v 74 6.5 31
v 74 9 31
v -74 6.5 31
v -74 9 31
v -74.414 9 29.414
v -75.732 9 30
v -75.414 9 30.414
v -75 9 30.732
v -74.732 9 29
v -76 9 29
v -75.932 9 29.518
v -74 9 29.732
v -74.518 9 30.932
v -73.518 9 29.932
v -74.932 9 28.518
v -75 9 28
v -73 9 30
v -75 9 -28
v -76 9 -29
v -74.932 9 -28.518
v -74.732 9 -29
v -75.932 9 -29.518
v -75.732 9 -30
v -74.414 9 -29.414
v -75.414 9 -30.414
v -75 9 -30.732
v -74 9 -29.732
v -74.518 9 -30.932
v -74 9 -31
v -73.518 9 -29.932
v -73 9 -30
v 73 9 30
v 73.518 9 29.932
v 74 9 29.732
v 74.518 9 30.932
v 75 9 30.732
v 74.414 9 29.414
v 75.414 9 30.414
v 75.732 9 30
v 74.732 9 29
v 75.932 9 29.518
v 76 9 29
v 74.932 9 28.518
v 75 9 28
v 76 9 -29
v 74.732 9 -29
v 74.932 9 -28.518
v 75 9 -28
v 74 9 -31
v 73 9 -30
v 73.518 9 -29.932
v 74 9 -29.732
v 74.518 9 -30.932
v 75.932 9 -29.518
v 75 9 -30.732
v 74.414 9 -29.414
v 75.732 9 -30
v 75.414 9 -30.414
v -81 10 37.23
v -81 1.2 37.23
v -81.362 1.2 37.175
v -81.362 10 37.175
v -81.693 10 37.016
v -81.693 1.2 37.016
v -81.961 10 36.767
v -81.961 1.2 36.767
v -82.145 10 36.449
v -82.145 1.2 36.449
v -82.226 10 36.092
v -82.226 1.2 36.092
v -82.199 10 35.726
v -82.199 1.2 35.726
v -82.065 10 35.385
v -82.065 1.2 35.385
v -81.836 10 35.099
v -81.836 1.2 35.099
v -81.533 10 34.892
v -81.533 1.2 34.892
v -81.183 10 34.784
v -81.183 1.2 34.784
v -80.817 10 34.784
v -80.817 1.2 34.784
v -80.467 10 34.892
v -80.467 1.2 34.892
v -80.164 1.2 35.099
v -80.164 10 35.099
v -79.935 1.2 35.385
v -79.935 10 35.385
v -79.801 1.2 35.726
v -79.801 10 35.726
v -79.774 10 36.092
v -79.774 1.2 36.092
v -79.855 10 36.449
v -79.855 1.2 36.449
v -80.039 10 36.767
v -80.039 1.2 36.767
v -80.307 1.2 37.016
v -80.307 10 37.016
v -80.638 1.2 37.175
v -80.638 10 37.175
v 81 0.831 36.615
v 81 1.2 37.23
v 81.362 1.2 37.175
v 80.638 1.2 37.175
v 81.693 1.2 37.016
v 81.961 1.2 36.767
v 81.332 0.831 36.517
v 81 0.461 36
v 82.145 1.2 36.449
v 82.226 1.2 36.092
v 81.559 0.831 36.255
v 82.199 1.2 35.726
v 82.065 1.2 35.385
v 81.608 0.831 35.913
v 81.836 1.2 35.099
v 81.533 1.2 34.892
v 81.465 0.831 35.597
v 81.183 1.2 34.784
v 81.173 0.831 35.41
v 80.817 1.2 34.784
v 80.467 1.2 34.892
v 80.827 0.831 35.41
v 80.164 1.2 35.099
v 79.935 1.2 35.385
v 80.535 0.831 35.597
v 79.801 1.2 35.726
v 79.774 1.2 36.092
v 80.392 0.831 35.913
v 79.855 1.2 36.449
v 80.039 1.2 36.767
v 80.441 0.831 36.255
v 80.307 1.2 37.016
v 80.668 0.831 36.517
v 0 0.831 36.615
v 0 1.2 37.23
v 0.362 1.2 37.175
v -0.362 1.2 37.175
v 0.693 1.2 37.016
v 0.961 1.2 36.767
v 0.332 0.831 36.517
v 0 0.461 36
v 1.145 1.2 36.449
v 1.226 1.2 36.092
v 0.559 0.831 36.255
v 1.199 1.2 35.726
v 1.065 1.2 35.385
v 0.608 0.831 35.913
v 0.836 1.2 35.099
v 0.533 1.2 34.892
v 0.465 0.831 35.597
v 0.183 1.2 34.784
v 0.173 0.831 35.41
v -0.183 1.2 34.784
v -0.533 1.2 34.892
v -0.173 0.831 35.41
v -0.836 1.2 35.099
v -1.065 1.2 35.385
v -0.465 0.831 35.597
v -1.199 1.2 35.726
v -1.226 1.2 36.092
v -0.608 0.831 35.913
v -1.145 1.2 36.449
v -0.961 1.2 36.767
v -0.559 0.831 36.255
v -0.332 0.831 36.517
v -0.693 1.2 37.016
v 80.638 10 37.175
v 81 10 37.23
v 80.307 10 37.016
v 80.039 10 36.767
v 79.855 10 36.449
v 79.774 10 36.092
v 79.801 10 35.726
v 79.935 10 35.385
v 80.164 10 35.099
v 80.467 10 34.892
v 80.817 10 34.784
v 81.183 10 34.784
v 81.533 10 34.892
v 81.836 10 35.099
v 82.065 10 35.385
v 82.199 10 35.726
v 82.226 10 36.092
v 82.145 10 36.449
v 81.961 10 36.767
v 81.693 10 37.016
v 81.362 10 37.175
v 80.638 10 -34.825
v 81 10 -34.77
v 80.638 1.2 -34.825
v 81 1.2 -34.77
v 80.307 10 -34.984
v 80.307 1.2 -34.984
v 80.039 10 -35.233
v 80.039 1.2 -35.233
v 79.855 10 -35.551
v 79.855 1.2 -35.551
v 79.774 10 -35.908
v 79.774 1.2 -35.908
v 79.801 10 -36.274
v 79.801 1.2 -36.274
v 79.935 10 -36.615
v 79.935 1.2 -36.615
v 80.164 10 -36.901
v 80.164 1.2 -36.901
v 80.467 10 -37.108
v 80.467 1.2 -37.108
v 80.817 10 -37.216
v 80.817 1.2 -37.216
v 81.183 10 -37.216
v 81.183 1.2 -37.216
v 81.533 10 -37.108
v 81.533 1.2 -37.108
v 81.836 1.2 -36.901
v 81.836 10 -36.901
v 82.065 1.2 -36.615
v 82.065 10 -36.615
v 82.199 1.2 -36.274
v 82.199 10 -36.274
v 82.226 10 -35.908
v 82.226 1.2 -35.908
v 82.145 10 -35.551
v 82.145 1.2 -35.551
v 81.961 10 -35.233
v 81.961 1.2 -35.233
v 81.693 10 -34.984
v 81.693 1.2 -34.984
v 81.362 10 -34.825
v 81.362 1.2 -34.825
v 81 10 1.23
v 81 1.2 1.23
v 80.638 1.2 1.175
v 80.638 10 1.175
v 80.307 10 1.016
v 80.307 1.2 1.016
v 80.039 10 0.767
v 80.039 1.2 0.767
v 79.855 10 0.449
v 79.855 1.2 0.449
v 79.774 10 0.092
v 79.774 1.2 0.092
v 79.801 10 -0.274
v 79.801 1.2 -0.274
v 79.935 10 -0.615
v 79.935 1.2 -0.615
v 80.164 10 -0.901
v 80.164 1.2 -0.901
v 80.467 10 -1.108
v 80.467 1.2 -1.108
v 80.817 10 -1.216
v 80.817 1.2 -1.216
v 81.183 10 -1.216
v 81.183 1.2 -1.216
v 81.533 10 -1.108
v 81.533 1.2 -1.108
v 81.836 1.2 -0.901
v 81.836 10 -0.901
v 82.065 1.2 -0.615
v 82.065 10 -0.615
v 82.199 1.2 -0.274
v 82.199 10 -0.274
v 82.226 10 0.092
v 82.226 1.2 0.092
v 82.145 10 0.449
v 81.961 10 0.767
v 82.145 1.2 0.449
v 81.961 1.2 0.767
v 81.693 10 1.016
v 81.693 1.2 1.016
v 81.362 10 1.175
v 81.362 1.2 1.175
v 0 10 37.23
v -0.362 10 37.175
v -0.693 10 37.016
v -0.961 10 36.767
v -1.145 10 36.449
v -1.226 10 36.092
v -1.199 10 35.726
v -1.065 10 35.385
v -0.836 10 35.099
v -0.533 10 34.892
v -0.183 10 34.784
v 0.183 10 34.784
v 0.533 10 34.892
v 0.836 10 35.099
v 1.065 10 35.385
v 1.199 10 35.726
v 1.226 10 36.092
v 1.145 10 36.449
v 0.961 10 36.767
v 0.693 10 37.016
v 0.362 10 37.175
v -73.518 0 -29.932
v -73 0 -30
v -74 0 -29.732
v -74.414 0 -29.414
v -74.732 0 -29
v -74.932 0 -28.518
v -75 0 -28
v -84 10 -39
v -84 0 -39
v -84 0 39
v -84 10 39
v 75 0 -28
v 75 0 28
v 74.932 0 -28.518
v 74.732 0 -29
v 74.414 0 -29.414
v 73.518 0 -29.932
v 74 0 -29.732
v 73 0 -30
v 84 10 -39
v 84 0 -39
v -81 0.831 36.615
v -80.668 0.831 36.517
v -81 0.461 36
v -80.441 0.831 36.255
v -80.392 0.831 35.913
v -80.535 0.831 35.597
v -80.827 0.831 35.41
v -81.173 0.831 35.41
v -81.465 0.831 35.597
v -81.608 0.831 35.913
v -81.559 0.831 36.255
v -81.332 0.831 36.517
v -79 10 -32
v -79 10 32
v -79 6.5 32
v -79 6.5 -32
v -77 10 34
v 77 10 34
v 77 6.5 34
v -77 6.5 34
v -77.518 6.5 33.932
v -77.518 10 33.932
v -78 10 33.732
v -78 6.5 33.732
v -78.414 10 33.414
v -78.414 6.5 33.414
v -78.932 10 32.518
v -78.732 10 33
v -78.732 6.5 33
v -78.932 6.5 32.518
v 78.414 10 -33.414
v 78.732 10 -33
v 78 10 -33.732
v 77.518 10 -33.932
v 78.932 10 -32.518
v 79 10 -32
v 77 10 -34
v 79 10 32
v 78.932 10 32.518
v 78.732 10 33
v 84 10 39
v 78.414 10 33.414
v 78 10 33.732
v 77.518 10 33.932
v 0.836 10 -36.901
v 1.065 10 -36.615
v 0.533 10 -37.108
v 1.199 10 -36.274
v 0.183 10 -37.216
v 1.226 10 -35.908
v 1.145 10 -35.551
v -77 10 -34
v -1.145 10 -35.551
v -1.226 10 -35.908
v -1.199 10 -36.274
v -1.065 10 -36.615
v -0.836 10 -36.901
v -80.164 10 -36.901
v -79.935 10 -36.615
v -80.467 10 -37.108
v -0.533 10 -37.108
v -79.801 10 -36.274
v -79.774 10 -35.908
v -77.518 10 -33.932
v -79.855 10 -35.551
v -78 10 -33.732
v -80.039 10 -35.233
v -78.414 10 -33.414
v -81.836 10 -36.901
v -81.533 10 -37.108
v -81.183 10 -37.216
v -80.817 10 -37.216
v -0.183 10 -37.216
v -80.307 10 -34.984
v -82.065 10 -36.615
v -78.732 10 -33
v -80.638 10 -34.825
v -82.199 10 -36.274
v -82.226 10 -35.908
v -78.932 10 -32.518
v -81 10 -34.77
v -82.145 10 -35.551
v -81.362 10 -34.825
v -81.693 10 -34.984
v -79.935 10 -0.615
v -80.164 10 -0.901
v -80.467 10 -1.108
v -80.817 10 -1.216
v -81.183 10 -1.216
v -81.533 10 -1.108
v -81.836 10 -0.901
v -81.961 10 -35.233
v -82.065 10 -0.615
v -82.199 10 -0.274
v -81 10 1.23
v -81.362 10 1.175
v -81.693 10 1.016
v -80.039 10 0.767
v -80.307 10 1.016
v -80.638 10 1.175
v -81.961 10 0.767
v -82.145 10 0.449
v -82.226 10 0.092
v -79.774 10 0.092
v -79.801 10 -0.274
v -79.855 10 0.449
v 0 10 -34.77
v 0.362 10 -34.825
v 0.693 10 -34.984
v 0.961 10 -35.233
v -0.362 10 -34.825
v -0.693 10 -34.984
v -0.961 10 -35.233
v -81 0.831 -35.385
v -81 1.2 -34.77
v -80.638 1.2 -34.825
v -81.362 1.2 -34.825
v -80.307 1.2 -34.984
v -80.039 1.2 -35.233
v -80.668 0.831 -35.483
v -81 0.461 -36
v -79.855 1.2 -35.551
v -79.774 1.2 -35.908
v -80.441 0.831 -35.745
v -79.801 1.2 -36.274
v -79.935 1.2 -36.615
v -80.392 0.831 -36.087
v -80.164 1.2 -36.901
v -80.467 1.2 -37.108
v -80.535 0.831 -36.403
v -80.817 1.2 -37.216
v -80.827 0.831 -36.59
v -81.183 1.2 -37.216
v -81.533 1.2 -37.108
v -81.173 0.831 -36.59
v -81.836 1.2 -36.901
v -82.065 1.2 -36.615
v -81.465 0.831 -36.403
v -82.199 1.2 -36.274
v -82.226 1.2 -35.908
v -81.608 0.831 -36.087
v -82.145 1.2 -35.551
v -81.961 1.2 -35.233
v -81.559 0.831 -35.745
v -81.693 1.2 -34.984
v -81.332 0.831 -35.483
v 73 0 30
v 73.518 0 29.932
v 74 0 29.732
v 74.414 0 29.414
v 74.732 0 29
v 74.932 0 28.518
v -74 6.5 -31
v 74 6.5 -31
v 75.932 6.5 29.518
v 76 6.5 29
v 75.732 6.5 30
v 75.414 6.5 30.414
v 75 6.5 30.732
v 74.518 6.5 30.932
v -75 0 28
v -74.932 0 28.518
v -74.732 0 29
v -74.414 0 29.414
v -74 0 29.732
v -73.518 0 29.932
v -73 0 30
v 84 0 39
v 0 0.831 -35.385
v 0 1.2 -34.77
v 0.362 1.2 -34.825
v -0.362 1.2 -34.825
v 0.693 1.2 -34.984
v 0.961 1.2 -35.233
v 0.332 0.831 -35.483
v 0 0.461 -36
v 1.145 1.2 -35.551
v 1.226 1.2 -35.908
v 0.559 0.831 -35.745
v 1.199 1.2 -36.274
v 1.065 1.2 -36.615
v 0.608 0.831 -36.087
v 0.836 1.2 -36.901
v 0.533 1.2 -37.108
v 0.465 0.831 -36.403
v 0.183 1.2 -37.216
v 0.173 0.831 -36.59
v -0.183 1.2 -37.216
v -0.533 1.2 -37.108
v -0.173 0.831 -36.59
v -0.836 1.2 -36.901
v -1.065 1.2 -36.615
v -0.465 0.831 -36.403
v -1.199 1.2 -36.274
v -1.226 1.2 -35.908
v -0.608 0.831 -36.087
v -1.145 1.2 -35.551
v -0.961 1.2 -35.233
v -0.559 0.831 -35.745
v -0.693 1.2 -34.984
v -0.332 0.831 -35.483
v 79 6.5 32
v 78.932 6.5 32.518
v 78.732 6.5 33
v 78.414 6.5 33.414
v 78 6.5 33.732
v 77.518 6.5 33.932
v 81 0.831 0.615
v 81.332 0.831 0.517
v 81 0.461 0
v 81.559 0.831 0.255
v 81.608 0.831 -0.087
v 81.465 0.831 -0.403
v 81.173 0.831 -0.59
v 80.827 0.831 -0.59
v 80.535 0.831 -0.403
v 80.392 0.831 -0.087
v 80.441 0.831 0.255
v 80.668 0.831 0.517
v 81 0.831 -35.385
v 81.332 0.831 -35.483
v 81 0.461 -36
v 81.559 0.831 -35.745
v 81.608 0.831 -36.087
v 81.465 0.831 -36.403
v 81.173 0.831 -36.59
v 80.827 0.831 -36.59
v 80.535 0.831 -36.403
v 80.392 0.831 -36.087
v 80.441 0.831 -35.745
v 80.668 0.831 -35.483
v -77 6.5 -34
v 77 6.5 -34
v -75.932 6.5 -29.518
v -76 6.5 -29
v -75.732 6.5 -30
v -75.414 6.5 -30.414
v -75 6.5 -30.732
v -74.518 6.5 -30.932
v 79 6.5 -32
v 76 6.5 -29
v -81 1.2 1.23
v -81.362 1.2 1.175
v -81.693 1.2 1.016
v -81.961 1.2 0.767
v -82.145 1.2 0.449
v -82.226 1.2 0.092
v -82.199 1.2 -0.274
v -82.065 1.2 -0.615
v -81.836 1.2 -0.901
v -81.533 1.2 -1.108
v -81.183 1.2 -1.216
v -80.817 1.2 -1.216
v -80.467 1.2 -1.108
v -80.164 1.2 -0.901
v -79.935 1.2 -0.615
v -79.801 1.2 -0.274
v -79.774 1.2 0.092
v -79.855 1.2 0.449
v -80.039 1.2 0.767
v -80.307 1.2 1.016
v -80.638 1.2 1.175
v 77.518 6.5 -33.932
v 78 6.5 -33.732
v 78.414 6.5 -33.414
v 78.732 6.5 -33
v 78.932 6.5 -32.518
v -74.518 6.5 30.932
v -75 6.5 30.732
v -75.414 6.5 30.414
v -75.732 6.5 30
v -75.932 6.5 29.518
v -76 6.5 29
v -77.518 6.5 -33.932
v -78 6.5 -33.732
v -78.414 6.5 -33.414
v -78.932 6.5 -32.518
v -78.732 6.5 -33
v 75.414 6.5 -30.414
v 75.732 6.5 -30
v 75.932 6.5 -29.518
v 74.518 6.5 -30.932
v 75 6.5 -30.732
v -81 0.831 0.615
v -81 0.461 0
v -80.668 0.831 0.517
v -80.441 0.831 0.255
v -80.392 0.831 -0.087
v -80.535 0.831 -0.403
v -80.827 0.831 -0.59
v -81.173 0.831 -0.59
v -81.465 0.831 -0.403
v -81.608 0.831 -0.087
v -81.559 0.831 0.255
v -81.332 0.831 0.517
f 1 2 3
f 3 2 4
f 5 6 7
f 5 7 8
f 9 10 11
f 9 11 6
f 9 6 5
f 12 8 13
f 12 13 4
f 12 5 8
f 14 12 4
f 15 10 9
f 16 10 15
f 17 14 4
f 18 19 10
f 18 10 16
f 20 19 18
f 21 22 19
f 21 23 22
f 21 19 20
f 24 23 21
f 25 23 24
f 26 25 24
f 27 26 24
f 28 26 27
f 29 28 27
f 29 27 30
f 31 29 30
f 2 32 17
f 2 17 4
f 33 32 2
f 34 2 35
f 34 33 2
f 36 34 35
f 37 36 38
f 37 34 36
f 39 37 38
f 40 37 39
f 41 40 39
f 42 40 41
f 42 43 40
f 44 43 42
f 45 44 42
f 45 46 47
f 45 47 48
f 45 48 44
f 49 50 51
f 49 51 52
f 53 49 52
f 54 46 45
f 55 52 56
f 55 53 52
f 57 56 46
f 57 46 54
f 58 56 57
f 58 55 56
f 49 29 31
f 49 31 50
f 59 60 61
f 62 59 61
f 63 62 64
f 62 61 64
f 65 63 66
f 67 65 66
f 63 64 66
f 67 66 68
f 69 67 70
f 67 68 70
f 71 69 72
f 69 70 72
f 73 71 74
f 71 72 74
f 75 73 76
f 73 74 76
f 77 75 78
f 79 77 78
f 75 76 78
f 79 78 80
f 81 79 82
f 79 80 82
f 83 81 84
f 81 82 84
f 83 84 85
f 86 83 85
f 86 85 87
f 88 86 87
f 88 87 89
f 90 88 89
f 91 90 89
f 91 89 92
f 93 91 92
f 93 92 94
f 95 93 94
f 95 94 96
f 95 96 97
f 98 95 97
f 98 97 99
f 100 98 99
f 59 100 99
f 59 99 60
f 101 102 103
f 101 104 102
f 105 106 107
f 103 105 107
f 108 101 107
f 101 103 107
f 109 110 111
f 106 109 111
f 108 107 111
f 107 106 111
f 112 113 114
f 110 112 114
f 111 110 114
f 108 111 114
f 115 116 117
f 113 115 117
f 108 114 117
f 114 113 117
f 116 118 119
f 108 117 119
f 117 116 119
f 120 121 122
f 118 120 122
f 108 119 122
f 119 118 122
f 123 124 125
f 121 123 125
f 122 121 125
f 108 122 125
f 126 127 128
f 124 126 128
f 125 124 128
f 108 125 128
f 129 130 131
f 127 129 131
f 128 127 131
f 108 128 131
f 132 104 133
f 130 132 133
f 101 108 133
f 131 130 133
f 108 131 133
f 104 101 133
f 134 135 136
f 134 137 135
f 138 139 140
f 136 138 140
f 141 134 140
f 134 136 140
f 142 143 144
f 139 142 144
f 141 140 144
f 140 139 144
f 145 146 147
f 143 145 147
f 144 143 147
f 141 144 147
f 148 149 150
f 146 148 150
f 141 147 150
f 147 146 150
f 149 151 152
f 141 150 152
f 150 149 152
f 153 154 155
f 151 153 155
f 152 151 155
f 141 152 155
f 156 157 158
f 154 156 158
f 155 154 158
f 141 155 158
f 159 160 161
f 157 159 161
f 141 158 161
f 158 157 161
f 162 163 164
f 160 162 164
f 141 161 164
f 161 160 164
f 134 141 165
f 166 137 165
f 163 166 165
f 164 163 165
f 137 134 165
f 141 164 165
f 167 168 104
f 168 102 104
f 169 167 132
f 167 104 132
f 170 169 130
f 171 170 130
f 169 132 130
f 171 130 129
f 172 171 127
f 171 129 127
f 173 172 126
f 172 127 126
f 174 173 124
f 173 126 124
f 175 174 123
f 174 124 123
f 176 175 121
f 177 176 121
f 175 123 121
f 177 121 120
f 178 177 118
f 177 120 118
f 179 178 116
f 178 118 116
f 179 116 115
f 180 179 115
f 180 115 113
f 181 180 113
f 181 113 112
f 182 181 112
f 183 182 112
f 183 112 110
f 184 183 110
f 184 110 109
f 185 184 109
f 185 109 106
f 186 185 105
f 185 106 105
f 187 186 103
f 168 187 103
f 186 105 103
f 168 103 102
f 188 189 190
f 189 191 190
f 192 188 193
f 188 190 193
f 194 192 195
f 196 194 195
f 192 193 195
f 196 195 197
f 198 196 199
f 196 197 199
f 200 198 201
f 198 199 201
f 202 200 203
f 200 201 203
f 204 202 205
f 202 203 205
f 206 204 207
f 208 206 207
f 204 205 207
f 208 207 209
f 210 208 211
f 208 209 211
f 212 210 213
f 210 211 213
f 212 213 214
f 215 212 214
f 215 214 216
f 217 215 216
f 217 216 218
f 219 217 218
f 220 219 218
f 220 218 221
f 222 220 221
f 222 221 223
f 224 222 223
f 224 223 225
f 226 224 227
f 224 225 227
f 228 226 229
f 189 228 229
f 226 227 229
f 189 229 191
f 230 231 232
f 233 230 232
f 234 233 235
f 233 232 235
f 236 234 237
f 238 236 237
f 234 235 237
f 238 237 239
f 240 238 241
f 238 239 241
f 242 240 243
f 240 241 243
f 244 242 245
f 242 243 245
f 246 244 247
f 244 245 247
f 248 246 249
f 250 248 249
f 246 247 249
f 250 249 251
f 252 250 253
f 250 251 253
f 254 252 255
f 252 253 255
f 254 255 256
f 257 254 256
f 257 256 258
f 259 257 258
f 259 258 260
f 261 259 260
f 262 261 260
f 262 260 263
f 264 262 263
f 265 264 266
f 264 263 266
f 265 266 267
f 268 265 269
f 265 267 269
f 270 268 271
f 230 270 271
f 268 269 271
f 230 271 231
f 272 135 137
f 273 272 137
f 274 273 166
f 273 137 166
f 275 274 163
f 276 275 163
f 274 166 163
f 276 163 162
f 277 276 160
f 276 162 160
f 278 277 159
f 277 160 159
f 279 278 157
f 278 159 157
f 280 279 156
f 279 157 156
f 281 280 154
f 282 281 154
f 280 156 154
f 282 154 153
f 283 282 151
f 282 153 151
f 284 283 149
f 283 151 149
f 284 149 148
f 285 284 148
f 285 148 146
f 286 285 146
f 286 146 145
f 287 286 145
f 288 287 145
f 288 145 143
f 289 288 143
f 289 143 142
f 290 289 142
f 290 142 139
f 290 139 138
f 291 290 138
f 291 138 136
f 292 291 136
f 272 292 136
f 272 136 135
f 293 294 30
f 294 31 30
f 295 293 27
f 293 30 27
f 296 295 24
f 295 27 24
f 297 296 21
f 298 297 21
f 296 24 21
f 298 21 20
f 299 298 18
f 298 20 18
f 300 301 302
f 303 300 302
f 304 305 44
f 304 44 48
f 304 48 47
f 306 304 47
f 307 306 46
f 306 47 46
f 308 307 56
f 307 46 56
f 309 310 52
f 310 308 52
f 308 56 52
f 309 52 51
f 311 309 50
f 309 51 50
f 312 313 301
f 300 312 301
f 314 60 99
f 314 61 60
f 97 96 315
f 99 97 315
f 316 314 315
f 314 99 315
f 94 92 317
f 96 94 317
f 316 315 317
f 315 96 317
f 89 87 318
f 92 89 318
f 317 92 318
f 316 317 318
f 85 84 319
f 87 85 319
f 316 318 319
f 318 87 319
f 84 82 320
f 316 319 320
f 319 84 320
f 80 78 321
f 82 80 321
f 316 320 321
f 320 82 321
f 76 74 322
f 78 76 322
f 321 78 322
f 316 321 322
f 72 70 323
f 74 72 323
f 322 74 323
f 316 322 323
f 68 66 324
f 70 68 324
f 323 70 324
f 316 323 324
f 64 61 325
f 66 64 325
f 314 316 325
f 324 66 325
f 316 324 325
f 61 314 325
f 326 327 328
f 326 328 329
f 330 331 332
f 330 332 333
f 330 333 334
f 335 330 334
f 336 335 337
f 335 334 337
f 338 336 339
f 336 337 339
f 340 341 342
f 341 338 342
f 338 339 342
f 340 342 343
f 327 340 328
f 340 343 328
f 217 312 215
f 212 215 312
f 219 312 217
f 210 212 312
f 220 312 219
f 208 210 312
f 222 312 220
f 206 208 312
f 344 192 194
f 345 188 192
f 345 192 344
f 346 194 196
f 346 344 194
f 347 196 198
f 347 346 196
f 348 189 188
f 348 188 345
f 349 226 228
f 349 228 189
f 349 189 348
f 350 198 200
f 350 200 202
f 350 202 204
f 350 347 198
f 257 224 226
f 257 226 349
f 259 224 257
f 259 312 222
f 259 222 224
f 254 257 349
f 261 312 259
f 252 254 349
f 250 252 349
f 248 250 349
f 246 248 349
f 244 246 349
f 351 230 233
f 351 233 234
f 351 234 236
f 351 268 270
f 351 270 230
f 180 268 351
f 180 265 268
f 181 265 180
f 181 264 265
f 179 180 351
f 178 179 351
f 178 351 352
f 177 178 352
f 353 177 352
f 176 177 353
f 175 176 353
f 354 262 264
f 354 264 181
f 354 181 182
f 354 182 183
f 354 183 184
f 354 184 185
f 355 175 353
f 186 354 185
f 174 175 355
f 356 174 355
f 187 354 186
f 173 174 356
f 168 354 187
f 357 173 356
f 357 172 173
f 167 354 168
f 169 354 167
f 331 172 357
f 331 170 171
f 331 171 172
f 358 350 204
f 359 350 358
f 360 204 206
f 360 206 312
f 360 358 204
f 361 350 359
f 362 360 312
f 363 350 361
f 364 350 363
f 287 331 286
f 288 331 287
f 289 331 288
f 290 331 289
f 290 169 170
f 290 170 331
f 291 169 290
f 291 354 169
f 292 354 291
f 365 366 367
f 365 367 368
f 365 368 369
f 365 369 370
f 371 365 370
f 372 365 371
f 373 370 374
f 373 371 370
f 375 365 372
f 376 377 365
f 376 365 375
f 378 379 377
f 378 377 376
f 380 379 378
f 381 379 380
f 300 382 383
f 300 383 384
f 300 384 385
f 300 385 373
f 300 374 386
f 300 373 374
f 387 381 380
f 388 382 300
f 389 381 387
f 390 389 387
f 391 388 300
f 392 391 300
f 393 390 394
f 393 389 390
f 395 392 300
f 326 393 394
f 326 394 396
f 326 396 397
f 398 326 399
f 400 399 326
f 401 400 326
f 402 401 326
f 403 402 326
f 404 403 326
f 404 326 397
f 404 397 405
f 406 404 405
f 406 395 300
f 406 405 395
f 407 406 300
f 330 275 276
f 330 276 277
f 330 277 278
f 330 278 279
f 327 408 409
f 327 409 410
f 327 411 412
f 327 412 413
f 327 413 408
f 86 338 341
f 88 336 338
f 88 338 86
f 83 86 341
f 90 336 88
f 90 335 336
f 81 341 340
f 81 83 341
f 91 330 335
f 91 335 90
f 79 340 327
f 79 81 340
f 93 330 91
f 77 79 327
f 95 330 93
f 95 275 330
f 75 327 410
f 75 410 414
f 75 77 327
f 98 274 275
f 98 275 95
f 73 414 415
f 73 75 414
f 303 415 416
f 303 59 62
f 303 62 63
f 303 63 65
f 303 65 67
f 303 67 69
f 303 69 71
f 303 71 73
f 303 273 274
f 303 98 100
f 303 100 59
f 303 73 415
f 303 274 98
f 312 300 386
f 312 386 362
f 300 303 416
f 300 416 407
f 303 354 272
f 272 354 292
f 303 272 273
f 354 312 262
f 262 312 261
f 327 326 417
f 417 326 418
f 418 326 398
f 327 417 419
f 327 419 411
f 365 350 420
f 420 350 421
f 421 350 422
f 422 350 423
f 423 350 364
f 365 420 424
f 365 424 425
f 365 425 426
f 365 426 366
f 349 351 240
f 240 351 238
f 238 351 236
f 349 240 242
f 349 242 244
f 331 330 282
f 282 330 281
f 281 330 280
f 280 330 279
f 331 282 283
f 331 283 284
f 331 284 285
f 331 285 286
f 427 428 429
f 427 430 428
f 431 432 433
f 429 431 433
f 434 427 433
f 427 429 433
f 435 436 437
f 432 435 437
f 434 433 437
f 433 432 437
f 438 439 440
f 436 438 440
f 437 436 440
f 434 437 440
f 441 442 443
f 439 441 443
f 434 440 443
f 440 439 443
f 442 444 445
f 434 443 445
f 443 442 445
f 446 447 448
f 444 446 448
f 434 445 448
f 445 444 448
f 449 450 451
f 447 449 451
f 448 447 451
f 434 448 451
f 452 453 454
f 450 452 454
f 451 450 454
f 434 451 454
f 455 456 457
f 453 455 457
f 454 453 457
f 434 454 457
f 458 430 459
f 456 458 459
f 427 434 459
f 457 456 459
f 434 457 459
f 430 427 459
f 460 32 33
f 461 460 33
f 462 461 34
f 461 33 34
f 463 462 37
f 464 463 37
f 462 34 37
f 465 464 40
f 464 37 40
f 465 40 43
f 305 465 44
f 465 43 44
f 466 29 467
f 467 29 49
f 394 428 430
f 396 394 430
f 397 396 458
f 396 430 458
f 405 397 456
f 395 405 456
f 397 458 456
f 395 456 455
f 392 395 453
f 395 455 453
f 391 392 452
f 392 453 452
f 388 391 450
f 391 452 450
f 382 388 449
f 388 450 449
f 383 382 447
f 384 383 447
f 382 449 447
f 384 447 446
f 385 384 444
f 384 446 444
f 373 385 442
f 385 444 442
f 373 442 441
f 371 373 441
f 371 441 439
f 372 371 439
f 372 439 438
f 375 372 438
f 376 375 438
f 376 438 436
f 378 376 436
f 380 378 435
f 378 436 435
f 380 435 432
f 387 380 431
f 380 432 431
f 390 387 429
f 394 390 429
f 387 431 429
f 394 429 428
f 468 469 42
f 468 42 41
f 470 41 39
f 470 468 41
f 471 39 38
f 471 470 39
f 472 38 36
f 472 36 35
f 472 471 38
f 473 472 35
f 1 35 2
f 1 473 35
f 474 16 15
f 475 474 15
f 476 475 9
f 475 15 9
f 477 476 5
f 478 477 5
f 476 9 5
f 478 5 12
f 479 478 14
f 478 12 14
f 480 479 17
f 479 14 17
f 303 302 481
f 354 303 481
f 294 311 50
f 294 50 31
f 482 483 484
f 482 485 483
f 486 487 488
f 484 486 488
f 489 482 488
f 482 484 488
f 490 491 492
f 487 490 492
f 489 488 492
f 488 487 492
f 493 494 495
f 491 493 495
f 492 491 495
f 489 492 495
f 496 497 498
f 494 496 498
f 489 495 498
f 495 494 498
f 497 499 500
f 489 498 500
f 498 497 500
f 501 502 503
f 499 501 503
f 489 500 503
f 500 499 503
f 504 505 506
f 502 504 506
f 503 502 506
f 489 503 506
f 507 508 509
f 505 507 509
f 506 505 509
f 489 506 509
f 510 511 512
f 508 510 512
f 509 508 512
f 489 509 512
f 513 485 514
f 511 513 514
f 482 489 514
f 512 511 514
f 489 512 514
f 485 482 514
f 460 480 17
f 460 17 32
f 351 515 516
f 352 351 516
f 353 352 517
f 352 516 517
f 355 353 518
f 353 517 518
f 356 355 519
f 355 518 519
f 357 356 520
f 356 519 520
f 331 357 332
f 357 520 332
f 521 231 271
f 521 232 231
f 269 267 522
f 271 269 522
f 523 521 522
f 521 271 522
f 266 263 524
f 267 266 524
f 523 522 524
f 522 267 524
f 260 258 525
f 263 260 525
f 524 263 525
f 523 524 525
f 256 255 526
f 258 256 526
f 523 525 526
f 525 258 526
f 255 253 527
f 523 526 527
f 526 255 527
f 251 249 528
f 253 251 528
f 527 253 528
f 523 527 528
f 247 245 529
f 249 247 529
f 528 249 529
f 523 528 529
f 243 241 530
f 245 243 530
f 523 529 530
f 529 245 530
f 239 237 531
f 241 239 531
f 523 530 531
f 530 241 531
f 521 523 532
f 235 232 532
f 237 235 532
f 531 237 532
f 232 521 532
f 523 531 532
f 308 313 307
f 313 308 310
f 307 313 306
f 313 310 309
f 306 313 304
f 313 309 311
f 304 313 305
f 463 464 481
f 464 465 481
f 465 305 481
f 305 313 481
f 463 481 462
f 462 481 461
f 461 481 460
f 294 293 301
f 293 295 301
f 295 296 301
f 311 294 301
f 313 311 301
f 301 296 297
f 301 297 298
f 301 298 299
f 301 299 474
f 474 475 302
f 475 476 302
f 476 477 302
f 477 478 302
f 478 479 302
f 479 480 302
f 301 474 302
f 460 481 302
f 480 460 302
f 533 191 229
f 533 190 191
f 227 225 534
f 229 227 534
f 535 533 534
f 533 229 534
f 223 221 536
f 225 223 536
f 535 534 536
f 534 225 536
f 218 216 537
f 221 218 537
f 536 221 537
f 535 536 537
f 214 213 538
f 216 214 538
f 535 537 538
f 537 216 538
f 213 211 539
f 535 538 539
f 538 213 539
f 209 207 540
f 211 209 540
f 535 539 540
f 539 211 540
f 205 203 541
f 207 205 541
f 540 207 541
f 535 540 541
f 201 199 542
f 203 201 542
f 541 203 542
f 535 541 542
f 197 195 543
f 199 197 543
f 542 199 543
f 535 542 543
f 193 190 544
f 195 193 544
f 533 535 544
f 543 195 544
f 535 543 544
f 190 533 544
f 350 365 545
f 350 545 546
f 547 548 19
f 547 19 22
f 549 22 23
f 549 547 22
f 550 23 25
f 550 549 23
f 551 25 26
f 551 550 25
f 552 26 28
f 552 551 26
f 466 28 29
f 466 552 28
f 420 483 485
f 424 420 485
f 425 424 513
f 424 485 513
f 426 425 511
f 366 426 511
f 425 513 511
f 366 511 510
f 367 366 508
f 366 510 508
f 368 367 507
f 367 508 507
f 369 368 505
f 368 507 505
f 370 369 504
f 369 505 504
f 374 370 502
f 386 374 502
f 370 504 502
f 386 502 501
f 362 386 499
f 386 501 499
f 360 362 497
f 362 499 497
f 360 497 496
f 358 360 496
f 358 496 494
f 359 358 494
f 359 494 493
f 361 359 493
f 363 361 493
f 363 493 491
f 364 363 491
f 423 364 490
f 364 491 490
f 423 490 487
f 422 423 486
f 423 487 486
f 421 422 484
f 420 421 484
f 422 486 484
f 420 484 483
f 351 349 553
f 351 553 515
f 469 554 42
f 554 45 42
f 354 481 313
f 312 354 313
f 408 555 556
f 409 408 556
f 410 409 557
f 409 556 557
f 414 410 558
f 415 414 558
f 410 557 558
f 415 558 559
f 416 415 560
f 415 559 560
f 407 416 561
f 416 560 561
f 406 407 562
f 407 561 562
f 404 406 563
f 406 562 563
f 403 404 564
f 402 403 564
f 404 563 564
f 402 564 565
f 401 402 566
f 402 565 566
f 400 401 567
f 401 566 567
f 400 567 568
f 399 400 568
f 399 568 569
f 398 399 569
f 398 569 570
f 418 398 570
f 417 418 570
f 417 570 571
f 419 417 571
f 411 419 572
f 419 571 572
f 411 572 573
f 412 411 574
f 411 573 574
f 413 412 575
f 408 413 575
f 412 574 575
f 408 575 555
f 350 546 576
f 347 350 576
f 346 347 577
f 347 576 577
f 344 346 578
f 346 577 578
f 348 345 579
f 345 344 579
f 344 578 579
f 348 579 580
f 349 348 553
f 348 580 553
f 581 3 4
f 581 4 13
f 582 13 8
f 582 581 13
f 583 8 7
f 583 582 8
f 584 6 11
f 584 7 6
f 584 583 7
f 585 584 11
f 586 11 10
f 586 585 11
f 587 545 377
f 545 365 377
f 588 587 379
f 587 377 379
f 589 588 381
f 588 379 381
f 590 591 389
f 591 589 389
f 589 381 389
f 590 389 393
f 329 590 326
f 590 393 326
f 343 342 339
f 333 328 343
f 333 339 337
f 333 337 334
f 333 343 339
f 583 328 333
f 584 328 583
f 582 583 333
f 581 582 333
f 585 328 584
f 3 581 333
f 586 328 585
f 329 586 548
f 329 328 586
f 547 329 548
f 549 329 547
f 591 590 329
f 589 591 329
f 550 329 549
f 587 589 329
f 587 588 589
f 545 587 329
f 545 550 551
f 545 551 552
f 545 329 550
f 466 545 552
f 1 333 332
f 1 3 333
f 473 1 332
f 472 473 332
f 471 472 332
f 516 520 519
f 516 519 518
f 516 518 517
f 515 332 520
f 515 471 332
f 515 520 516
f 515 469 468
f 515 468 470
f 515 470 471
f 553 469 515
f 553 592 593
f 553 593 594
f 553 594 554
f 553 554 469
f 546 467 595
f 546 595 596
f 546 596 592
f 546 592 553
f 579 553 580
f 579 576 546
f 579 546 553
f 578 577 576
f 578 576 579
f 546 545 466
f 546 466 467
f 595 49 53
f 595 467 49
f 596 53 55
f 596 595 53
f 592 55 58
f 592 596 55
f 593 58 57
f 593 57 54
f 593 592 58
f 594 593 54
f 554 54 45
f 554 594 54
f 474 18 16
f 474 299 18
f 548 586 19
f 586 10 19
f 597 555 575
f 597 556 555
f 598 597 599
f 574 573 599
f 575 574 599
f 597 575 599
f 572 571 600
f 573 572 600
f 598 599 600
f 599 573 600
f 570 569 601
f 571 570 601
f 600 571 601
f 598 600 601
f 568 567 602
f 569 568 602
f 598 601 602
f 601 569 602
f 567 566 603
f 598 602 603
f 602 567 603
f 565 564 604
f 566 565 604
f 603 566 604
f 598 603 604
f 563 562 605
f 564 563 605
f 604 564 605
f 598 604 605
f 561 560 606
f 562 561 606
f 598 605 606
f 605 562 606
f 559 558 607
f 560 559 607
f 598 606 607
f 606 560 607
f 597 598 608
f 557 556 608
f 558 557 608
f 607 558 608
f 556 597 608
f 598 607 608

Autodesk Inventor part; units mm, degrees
ref_plane "YZ Plane" through (0, 0, 0) normal (1, 0, 0) x (0, 1, 0)
ref_plane "XZ Plane" through (0, 0, 0) normal (0, 1, 0) x (-1, 0, 0)
ref_plane "XY Plane" through (0, 0, 0) normal (0, 0, 1) x (1, 0, 0)
sketch "Sketch2" plane through (0, 0, 0) normal (0, 1, 0) x (-1, 0, 0)
  line L0 (-75, -30) -> (75, -30)
  line L1 (75, -30) -> (75, 30)
  line L2 (75, 30) -> (-75, 30)
  line L3 (-75, 30) -> (-75, -30)
  line L4 (-75, -30) -> (75, 30) construction
  line L5 (75, -30) -> (-75, 30) construction
  line L6 (-84, -39) -> (84, -39)
  line L7 (84, -39) -> (84, 39)
  line L8 (84, 39) -> (-84, 39)
  line L9 (-84, 39) -> (-84, -39)
  line L10 (-84, -39) -> (84, 39) construction
  line L11 (84, -39) -> (-84, 39) construction
  point P0 (0, 0)
  dimension "d0" = 150
  dimension "d1" = 60
  dimension "d4" = 9
  dimension "d5" = 9
  dimension "d53" = 168
  dimension "d54" = 78
extrude "Extrusion1" add sketch "Sketch2" along normal blind 10
sketch "Sketch4" plane through (0, 10, 0) normal (0, 1, 0) x (1, 0, 0)
  line L0 (-84, 39) -> (-84, -39) construction
  line L1 (-84, -39) -> (84, -39) construction
  line L2 (84, -39) -> (84, 39) construction
  line L3 (84, 39) -> (-84, 39) construction
  line L4 (75, 30) -> (75, -30) construction
  line L5 (75, -30) -> (-75, -30) construction
  line L6 (-75, -30) -> (-75, 30) construction
  line L7 (-75, 30) -> (75, 30) construction
  line L8 (-75, 30) -> (75, 30)
  line L9 (75, 30) -> (75, -30)
  line L10 (75, -30) -> (-75, -30)
  line L11 (-75, -30) -> (-75, 30)
  line L12 (-75, 30) -> (75, -30) construction
  line L13 (75, 30) -> (-75, -30) construction
  line L14 (-79, 34) -> (79, 34)
  line L15 (79, 34) -> (79, -34)
  line L16 (79, -34) -> (-79, -34)
  line L17 (-79, -34) -> (-79, 34)
  line L18 (-79, 34) -> (79, -34) construction
  line L19 (79, 34) -> (-79, -34) construction
  point P0 (0, 0)
  dimension "d8" = 4
  dimension "d9" = 4
extrude "Extrusion2" cut sketch "Sketch4" against normal blind 1
sketch "Sketch7" plane through (0, 9, 0) normal (0, 1, 0) x (1, 0, 0)
  line L0 (79, -34) -> (-79, -34) construction
  line L1 (79, 34) -> (79, -34) construction
  line L2 (-79, 34) -> (79, 34) construction
  line L3 (-79, -34) -> (-79, 34) construction
  line L4 (75, 30) -> (-75, 30) construction
  line L5 (75, -30) -> (75, 30) construction
  line L6 (-75, -30) -> (75, -30) construction
  line L7 (-75, 30) -> (-75, -30) construction
  line L8 (-76, 31) -> (76, 31)
  line L9 (76, 31) -> (76, -31)
  line L10 (76, -31) -> (-76, -31)
  line L11 (-76, -31) -> (-76, 31)
  line L12 (-76, 31) -> (76, -31) construction
  line L13 (76, 31) -> (-76, -31) construction
  line L14 (-79, 34) -> (79, 34)
  line L15 (79, 34) -> (79, -34)
  line L16 (79, -34) -> (-79, -34)
  line L17 (-79, -34) -> (-79, 34)
  line L18 (-79, 34) -> (79, -34) construction
  line L19 (79, 34) -> (-79, -34) construction
  point P0 (0, 0)
  dimension "d15" = 3
  dimension "d16" = 3
extrude "Extrusion3" cut sketch "Sketch7" against normal blind 2.5
fillet "Fillet1" radius 2 8 edges at (76, 7.75, 31) (-76, 7.75, 31) (-76, 7.75, -31) (76, 7.75, -31) (75, 4.5, 30) (75, 4.5, -30) (-75, 4.5, -30) (-75, 4.5, 30)
fillet "Fillet2" radius 2 4 edges at (79, 8.25, 34) (79, 8.25, -34) (-79, 8.25, 34) (-79, 8.25, -34)
sketch "Sketch8" plane through (0, 10, 0) normal (0, 1, 0) x (1, 0, 0)
  line L0 (79, 32) -> (79, -32) construction
  arc A0 (77, -34) -> (79, -32) centre (77, -32) ccw construction
  line L1 (77, -34) -> (-77, -34) construction
  arc A1 (-79, -32) -> (-77, -34) centre (-77, -32) ccw construction
  line L2 (-79, -32) -> (-79, 32) construction
  arc A2 (-77, 34) -> (-79, 32) centre (-77, 32) ccw construction
  line L3 (-77, 34) -> (77, 34) construction
  arc A3 (79, 32) -> (77, 34) centre (77, 32) ccw construction
  line L4 (-84, 39) -> (-84, -39) construction
  line L5 (-84, -39) -> (84, -39) construction
  line L6 (84, -39) -> (84, 39) construction
  line L7 (84, 39) -> (-84, 39) construction
  line L8 (152.6, 0) -> (-152.6, 0) construction
  line L9 (0, 68.6) -> (0, -68.6) construction
  line L10 (-75, 28) -> (-75, -28) construction
  line L11 (73, 30) -> (-73, 30) construction
  line L12 (75, -28) -> (75, 28) construction
  line L13 (-73, -30) -> (73, -30) construction
  point P0 (0, 0)
  point P1 (81, -36)
  point P2 (81, 0)
  point P3 (81, 36)
  point P4 (0, 36)
  point P5 (-81, 36)
  point P6 (-81, 0)
  point P7 (-81, -36)
  point P8 (0, -36)
  dimension "d21" = 5
  dimension "d41" = 6
  dimension "d42" = 6
  dimension "d43" = 6
  dimension "d44" = 6
  dimension "d45" = 6
  dimension "d46" = 6
  dimension "d47" = 6
  dimension "d48" = 6
  dimension "d49" = 6
  dimension "d50" = 6
  dimension "d51" = 6
  dimension "d52" = 6
hole "Hole1" at (81, 10, 36) at (81, 10, 0) at (81, 10, -36) at (0, 10, -36) at (-81, 10, -36) at (-81, 10, 0) at (-81, 10, 36) at (0, 10, 36) direction (0, -1, 0) diameter 2.459 depth 8.8 tip angle 118 thread size "M3x0.5" class "6H" standard "ISO Metric profile"
properties part number "P031_MonoVitreBas"
